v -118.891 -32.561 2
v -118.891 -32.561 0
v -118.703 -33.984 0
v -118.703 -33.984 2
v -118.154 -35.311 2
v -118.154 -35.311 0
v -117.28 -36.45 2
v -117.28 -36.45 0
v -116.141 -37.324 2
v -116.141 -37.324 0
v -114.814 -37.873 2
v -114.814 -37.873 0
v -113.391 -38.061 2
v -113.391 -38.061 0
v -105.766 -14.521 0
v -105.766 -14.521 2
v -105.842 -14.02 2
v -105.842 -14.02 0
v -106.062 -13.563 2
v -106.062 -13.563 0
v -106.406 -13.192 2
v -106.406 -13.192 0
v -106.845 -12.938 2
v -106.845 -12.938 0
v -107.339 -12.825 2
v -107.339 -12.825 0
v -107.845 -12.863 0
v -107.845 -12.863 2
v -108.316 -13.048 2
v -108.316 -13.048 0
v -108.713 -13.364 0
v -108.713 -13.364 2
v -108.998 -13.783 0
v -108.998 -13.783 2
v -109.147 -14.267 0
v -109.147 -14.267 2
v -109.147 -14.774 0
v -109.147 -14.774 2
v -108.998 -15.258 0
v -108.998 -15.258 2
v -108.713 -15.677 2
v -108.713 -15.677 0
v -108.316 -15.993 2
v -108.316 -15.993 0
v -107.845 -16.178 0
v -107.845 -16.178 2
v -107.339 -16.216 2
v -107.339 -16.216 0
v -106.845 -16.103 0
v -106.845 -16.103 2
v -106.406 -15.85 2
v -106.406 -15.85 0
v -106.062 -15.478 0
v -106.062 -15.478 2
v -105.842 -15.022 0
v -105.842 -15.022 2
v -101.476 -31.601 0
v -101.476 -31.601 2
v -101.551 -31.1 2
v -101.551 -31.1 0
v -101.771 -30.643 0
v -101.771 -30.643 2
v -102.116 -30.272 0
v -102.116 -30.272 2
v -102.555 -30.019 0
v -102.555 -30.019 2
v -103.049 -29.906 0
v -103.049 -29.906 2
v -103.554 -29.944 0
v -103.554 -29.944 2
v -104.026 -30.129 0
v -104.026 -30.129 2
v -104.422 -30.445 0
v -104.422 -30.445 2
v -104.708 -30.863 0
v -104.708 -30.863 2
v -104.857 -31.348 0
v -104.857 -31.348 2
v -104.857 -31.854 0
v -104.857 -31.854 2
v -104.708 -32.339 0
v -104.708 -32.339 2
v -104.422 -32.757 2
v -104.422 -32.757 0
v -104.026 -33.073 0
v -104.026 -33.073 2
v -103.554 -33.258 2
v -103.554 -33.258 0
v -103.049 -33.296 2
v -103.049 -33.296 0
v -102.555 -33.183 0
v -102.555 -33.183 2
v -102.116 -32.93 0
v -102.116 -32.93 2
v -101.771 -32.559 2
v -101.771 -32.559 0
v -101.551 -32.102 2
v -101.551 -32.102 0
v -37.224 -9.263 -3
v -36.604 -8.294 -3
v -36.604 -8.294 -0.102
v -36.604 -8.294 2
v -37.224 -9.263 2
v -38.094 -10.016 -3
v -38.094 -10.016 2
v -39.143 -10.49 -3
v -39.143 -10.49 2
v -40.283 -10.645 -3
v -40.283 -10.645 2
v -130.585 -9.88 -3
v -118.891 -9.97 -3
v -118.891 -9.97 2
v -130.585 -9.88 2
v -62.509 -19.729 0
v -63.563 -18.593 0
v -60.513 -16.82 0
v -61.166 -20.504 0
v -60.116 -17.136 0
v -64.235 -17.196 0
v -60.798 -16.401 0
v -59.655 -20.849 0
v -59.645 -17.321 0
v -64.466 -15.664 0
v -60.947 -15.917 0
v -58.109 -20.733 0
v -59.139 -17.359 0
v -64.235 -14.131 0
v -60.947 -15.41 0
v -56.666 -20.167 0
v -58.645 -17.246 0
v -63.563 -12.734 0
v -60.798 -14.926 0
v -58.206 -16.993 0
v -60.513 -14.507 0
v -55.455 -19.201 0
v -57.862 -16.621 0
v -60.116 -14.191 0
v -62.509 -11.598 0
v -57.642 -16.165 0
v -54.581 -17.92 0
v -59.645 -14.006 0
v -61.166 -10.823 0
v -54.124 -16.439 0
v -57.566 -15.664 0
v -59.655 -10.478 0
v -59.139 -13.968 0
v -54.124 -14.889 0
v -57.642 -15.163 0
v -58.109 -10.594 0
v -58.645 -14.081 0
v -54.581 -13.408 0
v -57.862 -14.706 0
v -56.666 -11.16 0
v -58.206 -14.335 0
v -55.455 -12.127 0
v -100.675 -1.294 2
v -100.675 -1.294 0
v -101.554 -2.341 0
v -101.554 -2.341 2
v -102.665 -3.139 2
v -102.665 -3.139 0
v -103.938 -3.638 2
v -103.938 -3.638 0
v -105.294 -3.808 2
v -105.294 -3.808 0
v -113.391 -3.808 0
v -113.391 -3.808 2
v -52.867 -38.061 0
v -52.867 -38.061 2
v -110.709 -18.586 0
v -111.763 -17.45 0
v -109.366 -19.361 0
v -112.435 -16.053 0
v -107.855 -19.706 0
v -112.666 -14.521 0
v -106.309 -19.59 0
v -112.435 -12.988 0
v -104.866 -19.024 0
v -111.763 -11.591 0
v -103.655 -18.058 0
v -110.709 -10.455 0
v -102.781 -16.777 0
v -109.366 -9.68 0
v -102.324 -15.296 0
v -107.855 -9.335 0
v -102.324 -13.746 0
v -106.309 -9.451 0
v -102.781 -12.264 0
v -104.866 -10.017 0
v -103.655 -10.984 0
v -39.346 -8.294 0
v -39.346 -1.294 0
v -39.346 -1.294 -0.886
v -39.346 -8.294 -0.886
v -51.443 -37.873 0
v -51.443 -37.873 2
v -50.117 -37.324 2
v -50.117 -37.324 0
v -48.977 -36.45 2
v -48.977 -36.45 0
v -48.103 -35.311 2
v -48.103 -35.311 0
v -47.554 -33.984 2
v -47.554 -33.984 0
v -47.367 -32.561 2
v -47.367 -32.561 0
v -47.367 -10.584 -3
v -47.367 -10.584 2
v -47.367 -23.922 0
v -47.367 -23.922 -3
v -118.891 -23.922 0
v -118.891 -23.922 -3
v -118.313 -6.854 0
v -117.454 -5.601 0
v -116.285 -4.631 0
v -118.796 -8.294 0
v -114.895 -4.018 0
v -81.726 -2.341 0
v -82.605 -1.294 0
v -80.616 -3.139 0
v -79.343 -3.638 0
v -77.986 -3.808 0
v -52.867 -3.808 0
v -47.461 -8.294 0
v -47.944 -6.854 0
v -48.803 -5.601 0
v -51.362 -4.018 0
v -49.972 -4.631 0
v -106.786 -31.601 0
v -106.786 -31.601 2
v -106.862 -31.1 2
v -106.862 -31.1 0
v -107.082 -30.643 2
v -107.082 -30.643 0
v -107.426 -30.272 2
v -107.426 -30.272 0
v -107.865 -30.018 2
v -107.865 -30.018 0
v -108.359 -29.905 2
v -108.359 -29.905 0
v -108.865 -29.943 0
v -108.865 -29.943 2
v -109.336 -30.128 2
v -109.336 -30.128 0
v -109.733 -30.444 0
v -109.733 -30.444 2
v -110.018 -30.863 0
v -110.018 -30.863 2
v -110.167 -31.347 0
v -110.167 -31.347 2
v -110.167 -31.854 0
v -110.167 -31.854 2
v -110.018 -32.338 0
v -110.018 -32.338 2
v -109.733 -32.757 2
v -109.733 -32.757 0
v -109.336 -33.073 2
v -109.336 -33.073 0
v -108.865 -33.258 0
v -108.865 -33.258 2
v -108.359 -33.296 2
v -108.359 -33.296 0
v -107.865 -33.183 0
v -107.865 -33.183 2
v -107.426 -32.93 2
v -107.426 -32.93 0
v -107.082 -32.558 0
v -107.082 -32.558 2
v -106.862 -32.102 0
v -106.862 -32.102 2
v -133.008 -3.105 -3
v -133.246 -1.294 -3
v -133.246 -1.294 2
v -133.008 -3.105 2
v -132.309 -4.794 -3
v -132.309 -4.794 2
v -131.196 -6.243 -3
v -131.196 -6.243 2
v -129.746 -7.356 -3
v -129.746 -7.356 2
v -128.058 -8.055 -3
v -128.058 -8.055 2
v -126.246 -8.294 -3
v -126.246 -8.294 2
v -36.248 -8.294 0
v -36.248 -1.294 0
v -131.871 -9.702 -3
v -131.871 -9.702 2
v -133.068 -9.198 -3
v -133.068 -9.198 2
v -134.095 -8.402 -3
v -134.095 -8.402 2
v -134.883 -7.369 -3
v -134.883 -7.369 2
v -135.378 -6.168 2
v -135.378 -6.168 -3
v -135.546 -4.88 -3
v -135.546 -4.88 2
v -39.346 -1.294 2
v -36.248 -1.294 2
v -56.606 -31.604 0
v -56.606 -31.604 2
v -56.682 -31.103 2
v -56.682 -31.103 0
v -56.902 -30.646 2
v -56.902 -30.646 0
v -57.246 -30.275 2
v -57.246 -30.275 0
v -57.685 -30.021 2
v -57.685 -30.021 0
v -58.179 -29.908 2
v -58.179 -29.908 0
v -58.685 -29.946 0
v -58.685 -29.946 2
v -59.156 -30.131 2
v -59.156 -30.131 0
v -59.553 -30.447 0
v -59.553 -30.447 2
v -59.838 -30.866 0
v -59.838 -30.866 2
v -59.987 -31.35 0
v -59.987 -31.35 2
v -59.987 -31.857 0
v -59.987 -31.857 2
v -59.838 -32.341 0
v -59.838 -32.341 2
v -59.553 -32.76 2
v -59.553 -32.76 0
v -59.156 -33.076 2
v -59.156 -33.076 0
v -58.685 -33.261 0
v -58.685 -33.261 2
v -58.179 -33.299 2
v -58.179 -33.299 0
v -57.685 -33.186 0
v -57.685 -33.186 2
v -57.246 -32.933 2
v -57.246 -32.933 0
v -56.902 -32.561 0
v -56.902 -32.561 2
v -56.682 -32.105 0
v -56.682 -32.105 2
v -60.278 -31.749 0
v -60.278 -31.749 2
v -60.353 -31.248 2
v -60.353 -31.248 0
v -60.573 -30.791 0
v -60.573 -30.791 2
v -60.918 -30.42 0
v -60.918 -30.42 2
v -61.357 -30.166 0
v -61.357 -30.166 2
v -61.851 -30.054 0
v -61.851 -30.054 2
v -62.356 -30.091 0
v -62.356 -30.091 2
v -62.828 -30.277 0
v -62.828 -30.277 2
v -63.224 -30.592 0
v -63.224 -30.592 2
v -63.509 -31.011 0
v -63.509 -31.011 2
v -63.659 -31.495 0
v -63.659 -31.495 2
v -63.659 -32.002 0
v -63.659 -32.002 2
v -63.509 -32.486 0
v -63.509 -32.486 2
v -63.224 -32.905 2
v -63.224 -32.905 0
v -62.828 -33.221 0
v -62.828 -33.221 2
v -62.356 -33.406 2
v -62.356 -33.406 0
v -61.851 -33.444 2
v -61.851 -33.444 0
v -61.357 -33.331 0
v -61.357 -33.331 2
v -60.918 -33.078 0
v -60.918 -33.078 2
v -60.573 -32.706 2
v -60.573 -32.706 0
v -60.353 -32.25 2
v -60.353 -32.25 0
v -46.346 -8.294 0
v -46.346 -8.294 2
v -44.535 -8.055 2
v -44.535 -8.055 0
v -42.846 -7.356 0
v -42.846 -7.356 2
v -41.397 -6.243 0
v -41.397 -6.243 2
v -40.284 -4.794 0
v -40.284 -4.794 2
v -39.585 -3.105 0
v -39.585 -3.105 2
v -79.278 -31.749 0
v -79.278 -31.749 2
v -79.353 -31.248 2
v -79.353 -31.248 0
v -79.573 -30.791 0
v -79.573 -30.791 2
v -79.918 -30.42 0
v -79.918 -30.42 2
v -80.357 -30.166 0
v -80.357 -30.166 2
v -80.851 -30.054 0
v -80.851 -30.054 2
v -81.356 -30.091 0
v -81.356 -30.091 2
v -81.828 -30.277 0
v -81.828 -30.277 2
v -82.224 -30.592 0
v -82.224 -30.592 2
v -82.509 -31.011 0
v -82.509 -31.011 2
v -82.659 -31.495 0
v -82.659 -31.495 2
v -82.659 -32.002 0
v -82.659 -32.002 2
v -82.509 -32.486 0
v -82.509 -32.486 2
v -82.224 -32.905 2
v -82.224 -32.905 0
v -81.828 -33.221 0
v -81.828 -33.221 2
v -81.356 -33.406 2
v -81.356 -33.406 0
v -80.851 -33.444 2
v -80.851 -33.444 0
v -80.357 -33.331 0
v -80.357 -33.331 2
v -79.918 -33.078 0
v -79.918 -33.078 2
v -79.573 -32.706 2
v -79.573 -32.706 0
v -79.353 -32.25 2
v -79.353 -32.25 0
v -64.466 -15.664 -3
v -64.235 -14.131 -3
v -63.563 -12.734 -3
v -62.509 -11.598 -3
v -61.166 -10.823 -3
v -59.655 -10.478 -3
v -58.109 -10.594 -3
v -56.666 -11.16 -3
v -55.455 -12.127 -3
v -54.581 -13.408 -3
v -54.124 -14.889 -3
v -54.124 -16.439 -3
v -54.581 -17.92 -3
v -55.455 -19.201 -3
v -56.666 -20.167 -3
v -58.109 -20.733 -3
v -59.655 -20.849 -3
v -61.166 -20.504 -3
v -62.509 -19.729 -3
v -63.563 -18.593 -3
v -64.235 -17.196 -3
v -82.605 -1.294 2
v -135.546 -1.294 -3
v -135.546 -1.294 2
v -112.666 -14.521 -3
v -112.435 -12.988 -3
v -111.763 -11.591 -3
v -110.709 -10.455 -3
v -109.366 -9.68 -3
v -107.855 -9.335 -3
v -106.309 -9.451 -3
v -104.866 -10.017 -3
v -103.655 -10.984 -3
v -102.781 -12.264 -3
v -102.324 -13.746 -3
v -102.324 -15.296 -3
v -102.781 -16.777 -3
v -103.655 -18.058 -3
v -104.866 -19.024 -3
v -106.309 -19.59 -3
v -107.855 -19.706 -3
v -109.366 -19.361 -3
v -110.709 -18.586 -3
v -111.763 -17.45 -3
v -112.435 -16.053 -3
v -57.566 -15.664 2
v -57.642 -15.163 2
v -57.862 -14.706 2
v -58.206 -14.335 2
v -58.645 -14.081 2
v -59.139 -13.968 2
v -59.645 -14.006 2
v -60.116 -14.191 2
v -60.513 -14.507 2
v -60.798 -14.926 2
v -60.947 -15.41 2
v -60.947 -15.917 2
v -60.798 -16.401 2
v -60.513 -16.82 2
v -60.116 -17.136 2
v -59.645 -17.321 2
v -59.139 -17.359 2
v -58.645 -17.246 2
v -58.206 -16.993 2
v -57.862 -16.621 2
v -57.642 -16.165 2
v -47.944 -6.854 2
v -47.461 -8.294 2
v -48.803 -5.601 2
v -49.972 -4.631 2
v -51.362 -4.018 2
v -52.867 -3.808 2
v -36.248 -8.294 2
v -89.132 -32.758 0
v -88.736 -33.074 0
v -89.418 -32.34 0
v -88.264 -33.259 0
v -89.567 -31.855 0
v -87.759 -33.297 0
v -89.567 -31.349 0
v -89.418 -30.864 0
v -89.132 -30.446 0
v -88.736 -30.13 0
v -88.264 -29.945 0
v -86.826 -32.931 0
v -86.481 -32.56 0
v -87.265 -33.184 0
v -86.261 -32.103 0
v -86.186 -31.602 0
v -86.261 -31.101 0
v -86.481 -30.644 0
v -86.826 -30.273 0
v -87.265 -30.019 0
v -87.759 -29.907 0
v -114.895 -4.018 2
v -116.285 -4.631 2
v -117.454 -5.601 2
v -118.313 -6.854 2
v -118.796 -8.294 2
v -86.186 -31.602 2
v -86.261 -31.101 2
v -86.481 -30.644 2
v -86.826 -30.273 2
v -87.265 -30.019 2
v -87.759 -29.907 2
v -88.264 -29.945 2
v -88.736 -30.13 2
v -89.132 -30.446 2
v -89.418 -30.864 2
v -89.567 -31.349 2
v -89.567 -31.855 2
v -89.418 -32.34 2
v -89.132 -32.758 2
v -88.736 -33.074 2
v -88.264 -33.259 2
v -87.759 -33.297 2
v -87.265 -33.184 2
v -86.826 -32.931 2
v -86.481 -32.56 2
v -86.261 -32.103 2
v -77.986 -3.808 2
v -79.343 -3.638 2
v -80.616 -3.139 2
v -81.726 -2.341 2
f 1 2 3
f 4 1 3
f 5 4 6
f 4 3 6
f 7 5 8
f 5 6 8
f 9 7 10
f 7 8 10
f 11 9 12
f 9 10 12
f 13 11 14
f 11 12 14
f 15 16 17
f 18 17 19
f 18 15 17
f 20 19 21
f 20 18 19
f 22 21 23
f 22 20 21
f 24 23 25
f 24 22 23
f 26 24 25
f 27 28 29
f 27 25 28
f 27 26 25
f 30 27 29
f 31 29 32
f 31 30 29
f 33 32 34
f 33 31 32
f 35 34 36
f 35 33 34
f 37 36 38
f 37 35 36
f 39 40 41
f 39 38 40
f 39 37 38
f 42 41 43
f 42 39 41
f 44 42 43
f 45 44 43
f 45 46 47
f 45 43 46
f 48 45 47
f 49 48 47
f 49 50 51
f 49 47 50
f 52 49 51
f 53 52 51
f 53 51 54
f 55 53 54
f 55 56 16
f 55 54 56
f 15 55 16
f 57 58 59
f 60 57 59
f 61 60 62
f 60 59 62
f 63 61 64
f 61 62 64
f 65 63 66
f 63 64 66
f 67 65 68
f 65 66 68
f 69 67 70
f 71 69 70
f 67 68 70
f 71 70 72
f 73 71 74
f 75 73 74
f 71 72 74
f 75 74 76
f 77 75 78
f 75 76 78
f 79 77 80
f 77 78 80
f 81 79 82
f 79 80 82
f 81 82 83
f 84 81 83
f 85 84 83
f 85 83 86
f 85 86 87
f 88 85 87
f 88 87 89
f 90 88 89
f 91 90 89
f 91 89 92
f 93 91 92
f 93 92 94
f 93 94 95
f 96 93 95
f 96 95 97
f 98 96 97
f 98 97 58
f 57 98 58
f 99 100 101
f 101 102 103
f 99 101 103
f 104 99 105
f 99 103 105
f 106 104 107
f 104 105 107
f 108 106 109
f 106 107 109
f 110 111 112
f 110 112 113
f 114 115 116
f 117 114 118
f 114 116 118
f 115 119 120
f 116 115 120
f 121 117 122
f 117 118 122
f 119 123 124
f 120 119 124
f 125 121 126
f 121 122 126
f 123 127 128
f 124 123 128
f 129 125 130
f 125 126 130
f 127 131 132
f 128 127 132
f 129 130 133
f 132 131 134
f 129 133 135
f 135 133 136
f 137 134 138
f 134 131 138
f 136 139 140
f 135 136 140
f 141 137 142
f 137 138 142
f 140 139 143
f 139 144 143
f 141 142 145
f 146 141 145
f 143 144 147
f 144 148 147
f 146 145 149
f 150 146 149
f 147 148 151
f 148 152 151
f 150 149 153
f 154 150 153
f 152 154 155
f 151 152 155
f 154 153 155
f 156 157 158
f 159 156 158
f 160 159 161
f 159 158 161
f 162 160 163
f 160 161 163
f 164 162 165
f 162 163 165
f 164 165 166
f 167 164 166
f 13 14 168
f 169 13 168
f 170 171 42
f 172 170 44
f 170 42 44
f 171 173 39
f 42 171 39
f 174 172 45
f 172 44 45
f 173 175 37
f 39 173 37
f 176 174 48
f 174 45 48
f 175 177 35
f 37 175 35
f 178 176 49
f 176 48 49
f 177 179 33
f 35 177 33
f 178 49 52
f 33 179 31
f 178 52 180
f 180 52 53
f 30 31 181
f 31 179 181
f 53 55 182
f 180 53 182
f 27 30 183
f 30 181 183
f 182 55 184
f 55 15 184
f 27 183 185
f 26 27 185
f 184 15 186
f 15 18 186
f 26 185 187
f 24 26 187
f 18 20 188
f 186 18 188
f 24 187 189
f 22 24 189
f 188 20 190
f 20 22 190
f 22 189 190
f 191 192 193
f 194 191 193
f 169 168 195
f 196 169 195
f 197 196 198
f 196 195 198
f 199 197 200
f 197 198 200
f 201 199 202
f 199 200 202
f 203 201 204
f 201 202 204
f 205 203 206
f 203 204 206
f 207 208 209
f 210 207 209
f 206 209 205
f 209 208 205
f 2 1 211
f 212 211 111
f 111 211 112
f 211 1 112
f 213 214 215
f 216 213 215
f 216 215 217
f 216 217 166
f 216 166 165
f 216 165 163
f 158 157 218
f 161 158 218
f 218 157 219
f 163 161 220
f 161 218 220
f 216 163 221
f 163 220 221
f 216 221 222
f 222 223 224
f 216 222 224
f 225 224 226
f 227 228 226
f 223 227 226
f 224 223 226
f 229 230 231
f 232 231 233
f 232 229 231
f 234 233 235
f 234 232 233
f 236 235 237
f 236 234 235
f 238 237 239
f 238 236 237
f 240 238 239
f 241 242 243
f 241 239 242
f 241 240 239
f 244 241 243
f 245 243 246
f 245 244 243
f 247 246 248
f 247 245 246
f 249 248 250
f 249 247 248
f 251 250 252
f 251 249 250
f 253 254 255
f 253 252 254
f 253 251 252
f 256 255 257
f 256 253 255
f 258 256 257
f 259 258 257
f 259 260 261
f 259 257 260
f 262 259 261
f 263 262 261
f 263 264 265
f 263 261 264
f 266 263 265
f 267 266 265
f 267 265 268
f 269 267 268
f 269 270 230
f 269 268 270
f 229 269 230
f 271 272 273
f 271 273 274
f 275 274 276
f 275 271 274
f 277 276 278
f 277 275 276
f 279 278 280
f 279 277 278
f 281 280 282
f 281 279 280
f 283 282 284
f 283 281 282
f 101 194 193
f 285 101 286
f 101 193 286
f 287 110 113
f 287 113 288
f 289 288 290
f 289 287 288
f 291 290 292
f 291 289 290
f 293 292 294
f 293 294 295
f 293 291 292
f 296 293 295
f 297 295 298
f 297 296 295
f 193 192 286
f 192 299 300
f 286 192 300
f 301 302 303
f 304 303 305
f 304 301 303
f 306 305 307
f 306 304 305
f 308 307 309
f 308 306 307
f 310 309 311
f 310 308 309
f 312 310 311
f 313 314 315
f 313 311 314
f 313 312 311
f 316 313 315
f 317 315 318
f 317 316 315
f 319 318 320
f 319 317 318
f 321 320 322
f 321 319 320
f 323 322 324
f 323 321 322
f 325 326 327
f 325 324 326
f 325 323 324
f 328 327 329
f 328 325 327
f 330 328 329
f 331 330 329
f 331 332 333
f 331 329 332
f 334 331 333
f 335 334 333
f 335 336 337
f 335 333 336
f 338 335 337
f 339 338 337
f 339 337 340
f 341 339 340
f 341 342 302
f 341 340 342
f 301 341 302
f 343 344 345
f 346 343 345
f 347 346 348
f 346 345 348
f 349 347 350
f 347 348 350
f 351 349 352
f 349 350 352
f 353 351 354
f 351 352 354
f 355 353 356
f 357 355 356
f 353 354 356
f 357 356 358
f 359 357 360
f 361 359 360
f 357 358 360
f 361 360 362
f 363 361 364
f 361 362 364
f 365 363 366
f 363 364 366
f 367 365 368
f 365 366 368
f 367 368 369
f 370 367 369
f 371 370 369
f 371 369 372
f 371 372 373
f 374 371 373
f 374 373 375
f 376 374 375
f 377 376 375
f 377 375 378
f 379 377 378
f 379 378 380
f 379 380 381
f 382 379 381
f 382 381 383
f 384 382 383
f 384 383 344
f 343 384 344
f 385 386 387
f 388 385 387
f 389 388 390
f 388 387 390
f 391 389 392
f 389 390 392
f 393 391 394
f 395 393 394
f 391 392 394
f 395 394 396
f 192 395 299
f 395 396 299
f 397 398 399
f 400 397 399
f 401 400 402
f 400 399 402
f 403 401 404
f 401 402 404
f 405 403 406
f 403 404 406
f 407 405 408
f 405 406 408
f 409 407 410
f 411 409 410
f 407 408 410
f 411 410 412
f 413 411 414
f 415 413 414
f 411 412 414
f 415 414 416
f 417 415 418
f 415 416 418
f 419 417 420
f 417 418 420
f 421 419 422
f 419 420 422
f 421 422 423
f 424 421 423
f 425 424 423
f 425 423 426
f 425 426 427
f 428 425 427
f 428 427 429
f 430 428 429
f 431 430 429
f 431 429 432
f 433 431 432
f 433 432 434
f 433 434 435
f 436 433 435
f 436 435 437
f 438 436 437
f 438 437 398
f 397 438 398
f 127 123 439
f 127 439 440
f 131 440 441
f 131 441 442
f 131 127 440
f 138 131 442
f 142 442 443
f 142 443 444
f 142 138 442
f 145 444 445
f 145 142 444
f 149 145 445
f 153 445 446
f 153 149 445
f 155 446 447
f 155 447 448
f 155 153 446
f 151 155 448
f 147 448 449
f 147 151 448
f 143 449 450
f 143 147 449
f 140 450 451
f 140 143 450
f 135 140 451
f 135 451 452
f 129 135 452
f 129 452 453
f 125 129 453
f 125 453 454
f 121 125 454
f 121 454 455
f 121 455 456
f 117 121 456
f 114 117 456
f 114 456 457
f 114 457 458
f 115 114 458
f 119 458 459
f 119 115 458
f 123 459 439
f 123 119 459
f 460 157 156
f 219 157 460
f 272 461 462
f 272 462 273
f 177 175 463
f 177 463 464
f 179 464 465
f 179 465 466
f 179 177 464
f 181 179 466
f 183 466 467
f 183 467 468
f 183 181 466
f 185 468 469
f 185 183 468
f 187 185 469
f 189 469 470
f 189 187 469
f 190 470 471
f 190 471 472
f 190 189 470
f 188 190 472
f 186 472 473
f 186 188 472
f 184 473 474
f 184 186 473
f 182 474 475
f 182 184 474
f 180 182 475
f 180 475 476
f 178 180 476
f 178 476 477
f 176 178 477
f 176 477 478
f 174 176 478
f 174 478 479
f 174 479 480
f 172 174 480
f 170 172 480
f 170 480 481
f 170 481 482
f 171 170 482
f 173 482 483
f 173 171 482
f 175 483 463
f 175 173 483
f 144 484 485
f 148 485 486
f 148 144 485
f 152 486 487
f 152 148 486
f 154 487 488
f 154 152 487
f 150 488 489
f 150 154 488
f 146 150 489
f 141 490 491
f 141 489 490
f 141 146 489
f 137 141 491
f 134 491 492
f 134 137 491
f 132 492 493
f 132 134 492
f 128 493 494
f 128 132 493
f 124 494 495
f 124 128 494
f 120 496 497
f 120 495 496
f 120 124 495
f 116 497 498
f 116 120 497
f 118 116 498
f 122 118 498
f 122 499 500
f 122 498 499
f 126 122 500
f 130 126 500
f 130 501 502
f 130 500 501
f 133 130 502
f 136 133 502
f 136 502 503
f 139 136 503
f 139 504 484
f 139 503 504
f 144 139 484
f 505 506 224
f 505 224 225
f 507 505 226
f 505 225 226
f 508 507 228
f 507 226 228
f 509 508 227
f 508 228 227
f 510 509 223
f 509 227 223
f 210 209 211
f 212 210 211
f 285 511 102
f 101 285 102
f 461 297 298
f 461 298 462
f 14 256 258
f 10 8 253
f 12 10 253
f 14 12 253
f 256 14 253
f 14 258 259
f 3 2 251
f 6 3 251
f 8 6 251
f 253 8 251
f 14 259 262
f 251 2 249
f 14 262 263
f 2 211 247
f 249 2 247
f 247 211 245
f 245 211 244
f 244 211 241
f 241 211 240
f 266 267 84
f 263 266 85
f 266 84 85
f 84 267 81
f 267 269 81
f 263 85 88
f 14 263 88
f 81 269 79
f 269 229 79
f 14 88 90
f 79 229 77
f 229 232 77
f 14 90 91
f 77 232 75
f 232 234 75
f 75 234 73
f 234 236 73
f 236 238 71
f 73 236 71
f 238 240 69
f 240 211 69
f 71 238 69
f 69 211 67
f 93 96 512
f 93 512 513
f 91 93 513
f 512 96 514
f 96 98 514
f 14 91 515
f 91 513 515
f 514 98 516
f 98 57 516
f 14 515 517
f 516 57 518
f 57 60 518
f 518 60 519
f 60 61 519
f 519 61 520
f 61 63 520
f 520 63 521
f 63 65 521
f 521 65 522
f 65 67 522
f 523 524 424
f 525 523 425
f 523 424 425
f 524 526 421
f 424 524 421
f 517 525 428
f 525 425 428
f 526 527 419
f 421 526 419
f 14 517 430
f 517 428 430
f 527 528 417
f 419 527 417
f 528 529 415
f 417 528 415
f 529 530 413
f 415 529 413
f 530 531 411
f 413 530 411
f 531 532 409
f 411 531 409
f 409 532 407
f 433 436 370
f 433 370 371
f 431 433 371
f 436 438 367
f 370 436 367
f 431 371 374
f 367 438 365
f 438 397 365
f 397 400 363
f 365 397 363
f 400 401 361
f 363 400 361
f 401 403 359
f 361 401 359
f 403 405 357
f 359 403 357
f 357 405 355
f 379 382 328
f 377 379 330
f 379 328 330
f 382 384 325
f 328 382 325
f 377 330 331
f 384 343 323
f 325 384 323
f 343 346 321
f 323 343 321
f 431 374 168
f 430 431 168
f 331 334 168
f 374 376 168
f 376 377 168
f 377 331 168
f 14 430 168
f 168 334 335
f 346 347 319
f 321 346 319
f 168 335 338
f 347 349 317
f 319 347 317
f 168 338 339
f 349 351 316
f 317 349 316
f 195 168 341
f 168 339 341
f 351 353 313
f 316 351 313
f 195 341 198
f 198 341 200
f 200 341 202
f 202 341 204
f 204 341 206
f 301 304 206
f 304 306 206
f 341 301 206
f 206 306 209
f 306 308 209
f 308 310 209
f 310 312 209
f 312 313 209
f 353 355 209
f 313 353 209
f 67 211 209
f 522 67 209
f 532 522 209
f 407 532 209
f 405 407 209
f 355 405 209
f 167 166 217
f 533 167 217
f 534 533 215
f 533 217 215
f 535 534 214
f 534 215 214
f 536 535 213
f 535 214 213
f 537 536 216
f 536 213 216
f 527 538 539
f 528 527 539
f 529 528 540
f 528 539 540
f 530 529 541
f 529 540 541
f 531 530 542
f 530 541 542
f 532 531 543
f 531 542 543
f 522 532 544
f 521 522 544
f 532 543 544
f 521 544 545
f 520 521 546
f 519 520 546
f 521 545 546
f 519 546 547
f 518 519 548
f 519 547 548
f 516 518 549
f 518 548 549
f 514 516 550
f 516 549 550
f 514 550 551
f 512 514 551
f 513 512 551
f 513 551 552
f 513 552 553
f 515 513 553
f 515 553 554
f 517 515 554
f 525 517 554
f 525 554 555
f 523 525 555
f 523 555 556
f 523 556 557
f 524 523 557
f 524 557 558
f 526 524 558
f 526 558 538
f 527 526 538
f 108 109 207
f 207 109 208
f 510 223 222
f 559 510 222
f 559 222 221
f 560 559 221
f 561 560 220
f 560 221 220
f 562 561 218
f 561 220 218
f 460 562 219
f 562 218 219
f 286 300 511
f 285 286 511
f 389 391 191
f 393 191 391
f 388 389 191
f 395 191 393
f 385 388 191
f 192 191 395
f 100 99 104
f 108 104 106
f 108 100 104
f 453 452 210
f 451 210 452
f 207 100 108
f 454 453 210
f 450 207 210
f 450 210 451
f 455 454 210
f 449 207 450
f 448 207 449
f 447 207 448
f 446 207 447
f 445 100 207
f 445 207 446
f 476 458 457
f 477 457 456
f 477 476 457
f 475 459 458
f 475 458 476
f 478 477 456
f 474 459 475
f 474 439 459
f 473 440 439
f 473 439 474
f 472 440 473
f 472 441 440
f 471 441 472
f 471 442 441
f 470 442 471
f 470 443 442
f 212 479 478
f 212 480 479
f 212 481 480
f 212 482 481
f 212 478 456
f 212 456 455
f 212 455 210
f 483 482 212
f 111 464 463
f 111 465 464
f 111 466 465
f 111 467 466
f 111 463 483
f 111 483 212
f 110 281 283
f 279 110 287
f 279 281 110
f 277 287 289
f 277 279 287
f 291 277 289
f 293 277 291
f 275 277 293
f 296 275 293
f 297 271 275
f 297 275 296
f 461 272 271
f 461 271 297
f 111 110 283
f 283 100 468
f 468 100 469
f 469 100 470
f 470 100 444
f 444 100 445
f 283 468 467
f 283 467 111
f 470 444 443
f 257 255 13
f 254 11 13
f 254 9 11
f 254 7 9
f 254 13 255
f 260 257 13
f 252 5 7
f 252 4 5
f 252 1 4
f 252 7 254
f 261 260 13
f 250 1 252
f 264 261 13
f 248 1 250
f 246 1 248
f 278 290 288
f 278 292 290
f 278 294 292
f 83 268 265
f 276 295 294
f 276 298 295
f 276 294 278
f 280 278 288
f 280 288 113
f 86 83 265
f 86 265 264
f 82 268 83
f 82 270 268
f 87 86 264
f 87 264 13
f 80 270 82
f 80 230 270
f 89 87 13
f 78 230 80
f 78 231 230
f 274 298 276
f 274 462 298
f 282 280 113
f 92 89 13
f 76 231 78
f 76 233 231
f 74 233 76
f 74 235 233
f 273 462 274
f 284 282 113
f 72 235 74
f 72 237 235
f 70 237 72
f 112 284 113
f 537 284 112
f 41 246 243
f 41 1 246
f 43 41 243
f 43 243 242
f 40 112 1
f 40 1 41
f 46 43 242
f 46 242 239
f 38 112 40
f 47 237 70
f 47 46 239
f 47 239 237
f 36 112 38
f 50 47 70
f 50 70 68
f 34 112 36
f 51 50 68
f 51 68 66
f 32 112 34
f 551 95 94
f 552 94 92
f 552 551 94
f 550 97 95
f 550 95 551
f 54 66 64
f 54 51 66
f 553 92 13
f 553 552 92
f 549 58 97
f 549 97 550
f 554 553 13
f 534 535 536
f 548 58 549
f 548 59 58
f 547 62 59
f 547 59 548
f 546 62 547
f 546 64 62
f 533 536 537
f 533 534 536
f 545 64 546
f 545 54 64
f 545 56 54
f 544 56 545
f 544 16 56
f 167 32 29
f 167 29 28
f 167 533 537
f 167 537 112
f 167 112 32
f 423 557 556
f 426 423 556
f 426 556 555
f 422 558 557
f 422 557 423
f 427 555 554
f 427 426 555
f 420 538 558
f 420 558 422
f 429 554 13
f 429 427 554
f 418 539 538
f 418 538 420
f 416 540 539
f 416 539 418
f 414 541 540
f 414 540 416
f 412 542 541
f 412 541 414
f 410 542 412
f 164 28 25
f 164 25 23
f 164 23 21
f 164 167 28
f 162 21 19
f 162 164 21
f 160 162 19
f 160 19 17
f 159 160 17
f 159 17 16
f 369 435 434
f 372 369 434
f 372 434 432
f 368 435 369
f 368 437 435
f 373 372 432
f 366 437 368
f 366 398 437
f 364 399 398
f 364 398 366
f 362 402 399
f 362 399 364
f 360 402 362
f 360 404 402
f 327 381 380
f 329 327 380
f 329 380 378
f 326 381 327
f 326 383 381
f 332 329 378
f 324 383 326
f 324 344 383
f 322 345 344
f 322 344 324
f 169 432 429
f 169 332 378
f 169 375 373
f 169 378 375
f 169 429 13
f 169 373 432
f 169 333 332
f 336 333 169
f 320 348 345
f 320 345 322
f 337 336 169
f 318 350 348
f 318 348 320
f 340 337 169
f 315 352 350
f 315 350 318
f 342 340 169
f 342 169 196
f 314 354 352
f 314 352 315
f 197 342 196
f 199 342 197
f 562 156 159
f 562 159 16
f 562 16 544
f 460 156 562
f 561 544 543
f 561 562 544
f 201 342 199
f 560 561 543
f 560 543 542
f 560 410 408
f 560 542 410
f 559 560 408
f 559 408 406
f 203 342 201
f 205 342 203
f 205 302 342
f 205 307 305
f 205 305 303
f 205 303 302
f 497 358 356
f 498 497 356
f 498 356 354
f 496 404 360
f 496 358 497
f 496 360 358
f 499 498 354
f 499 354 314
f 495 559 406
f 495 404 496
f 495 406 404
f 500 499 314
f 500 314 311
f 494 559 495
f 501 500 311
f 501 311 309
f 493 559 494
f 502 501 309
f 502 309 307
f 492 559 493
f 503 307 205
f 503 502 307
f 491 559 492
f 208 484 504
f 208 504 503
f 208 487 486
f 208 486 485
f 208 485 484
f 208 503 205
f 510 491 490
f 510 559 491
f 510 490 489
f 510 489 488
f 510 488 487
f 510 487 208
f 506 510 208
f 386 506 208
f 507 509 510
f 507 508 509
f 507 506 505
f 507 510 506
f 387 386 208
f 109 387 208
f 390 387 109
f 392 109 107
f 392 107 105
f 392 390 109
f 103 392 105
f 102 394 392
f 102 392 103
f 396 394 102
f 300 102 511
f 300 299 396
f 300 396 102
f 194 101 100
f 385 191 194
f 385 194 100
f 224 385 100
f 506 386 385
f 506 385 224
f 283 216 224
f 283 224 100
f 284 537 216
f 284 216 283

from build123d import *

# Parameters (mm, degrees)
ESQUISSE1_R             = 1.7
BOSS_EXTRU_1_DEPTH      = 3
BOSS_EXTRU_2_DEPTH      = 3
BOSS_EXTRU_2_DEPTH_BACK = 3
ESQUISSE2_R             = 5.2
ESQUISSE5_W             = 129.390100882
ESQUISSE5_H             = 125.631489025
ENL_V_MAT_EXTRU_2_DEPTH = 1
ESQUISSE6_R             = 1.5
ENL_V_MAT_EXTRU_3_DEPTH = 8
ESQUISSE7_W             = 14.610679854
ESQUISSE7_H             = 62.75
ENL_V_MAT_EXTRU_4_DEPTH = 8
BOSS_EXTRU_3_DEPTH      = 7
BOSS_EXTRU_4_DEPTH      = 7
ESQUISSE11_W            = 143.807333736
ESQUISSE11_H            = 19.954067826
ENL_V_MAT_EXTRU_5_DEPTH = 89
ESQUISSE12_R            = 1.7
ENL_V_MAT_EXTRU_6_DEPTH = 31


with BuildPart() as part:
    # Esquisse1 → Boss.-Extru.1 (new body)
    with BuildSketch(Plane.XY):
        with BuildLine():
            Line((-117.680084405, 66.939310237), (-117.680084405, 59.695120061))
            ThreePointArc((-117.680084405, 59.695120061), (-116.069171702, 55.806032765), (-112.180084405, 54.195120061))
            Line((-112.180084405, 54.195120061), (-105.294175096, 54.195120061))
            ThreePointArc((-105.294175096, 54.195120061), (-101.4050878, 52.584207358), (-99.794175096, 48.695120061))
            Line((-99.794175096, 48.695120061), (-99.794175096, 35.930823665))
            ThreePointArc((-99.794175096, 35.930823665), (-101.4050878, 32.041736368), (-105.294175096, 30.430823665))
            Line((-105.294175096, 30.430823665), (-112.180084405, 30.430823665))
            ThreePointArc((-112.180084405, 30.430823665), (-116.069171702, 28.819910961), (-117.680084405, 24.930823665))
            Line((-117.680084405, 24.930823665), (-117.680084405, 23.910007682))
            ThreePointArc((-117.680084405, 23.910007682), (-116.069171702, 20.020920385), (-112.180084405, 18.410007682))
            Line((-112.180084405, 18.410007682), (-105.294175096, 18.410007682))
            ThreePointArc((-105.294175096, 18.410007682), (-101.4050878, 16.799094979), (-99.794175096, 12.910007682))
            Line((-99.794175096, 12.910007682), (-99.794175096, 1.692208933))
            ThreePointArc((-99.794175096, 1.692208933), (-101.4050878, -2.196878364), (-105.294175096, -3.807791067))
            Line((-105.294175096, -3.807791067), (-113.390601299, -3.807791067))
            ThreePointArc((-113.390601299, -3.807791067), (-117.279688595, -5.418703771), (-118.890601299, -9.307791067))
            Line((-118.890601299, -9.307791067), (-118.890601299, -18.42196685))
            Line((-118.890601299, -18.42196685), (-118.890601299, -32.5606385))
            ThreePointArc((-118.890601299, -32.5606385), (-117.279688595, -36.449725797), (-113.390601299, -38.0606385))
            Line((-113.390601299, -38.0606385), (-52.866544484, -38.0606385))
            ThreePointArc((-52.866544484, -38.0606385), (-48.977457187, -36.449725797), (-47.366544484, -32.5606385))
            Line((-47.366544484, -32.5606385), (-47.366544484, -18.42196685))
            Line((-47.366544484, -18.42196685), (-47.366544484, -9.307791067))
            ThreePointArc((-47.366544484, -9.307791067), (-48.977457187, -5.418703771), (-52.866544484, -3.807791067))
            Line((-52.866544484, -3.807791067), (-77.986378892, -3.807791067))
            ThreePointArc((-77.986378892, -3.807791067), (-81.875466189, -2.196878364), (-83.486378892, 1.692208933))
            Line((-83.486378892, 1.692208933), (-83.486378892, 12.910007682))
            ThreePointArc((-83.486378892, 12.910007682), (-81.875466189, 16.799094979), (-77.986378892, 18.410007682))
            Line((-77.986378892, 18.410007682), (-69.856378892, 18.410007682))
            ThreePointArc((-69.856378892, 18.410007682), (-65.967291596, 20.020920385), (-64.356378892, 23.910007682))
            Line((-64.356378892, 23.910007682), (-64.356378892, 24.930823665))
            ThreePointArc((-64.356378892, 24.930823665), (-65.967291596, 28.819910961), (-69.856378892, 30.430823665))
            Line((-69.856378892, 30.430823665), (-77.986378892, 30.430823665))
            ThreePointArc((-77.986378892, 30.430823665), (-81.875466189, 32.041736368), (-83.486378892, 35.930823665))
            Line((-83.486378892, 35.930823665), (-83.486378892, 55.219310237))
            ThreePointArc((-83.486378892, 55.219310237), (-81.875466189, 59.108397534), (-77.986378892, 60.719310237))
            Line((-77.986378892, 60.719310237), (-54.190366806, 60.719310237))
            ThreePointArc((-54.190366806, 60.719310237), (-50.30127951, 62.330222941), (-48.690366806, 66.219310237))
            Line((-48.690366806, 66.219310237), (-48.690366806, 67.219310237))
            ThreePointArc((-48.690366806, 67.219310237), (-50.30127951, 71.108397534), (-54.190366806, 72.719310237))
            Line((-54.190366806, 72.719310237), (-112.180084405, 72.719310237))
            ThreePointArc((-112.180084405, 72.719310237), (-116.069171702, 71.108397534), (-117.680084405, 67.219310237))
            Line((-117.680084405, 67.219310237), (-117.680084405, 66.939310237))
        make_face()
        with Locations((-59.266378892, -15.663707737)):
            Circle(ESQUISSE1_R, mode=Mode.SUBTRACT)
        with Locations((-59.266378892, 66.939310237)):
            Circle(ESQUISSE1_R, mode=Mode.SUBTRACT)
        with Locations((-91.856378892, 36.719310237)):
            Circle(ESQUISSE1_R, mode=Mode.SUBTRACT)
        with Locations((-107.466378892, -14.520689763)):
            Circle(ESQUISSE1_R, mode=Mode.SUBTRACT)
        with Locations((-107.466378892, 60.719310237)):
            Circle(ESQUISSE1_R, mode=Mode.SUBTRACT)
        with Locations((-58.306378892, -31.603707737)):
            Circle(ESQUISSE1_R, mode=Mode.SUBTRACT)
        with Locations((-108.486378892, -31.600689763)):
            Circle(ESQUISSE1_R, mode=Mode.SUBTRACT)
        with BuildLine():
            Line((-111.390601299, 21.460065469), (-70.086378892, 21.460065469))
            ThreePointArc((-70.086378892, 21.460065469), (-68.67216533, 22.045851906), (-68.086378892, 23.460065469))
            Line((-68.086378892, 23.460065469), (-68.086378892, 24.842520386))
            ThreePointArc((-68.086378892, 24.842520386), (-68.67216533, 26.256733949), (-70.086378892, 26.842520386))
            Line((-70.086378892, 26.842520386), (-111.390601299, 26.842520386))
            ThreePointArc((-111.390601299, 26.842520386), (-112.804814861, 26.256733949), (-113.390601299, 24.842520386))
            Line((-113.390601299, 24.842520386), (-113.390601299, 23.460065469))
            ThreePointArc((-113.390601299, 23.460065469), (-112.804814861, 22.045851906), (-111.390601299, 21.460065469))
        make_face(mode=Mode.SUBTRACT)
    extrude(amount=BOSS_EXTRU_1_DEPTH)

    # Esquisse2 → Boss.-Extru.2 (add, two sides: drawn at the far end of the back side and taken through both)
    with BuildSketch(Plane(origin=(0, 0, 0), x_dir=(-1, 0, 0), z_dir=(0, 0, -1)).offset(-BOSS_EXTRU_2_DEPTH_BACK)):
        with BuildLine():
            Line((118.890601299, -9.969506719), (130.584615963, -9.880075131))
            ThreePointArc((130.584615963, -9.880075131), (134.095405897, -8.402210456), (135.546378892, -4.880221341))
            Line((135.546378892, -4.880221341), (135.546378892, 5.415623015))
            ThreePointArc((135.546378892, 5.415623015), (136.425058549, 7.536943358), (138.546378892, 8.415623015))
            Line((138.546378892, 8.415623015), (145.752654566, 8.415623015))
            ThreePointArc((145.752654566, 8.415623015), (147.87397491, 9.294302671), (148.752654566, 11.415623015))
            Line((148.752654566, 11.415623015), (148.752654566, 38.179170847))
            ThreePointArc((148.752654566, 38.179170847), (147.87397491, 40.300491191), (145.752654566, 41.179170847))
            Line((145.752654566, 41.179170847), (138.546378892, 41.179170847))
            ThreePointArc((138.546378892, 41.179170847), (136.425058549, 42.057850504), (135.546378892, 44.179170847))
            Line((135.546378892, 44.179170847), (135.546378892, 52.099902349))
            ThreePointArc((135.546378892, 52.099902349), (134.081912798, 55.635436255), (130.546378892, 57.099902349))
            Line((130.546378892, 57.099902349), (117.680084405, 57.099902349))
            Line((117.680084405, 57.099902349), (117.680084405, 72.719310237))
            Line((117.680084405, 72.719310237), (48.690366806, 72.719310237))
            Line((48.690366806, 72.719310237), (48.690366806, 60.719310237))
            Line((48.690366806, 60.719310237), (48.690366806, 57.099902349))
            Line((48.690366806, 57.099902349), (40.256901013, 57.099902349))
            ThreePointArc((40.256901013, 57.099902349), (37.428473888, 55.928329474), (36.256901013, 53.099902349))
            Line((36.256901013, 53.099902349), (36.256901013, 47.456292263))
            Line((36.256901013, 47.456292263), (39.346378892, 47.456292263))
            ThreePointArc((39.346378892, 47.456292263), (41.396631424, 52.406039732), (46.346378892, 54.456292263))
            Line((46.346378892, 54.456292263), (126.246378892, 54.456292263))
            ThreePointArc((126.246378892, 54.456292263), (131.196126361, 52.406039732), (133.246378892, 47.456292263))
            Line((133.246378892, 47.456292263), (133.246378892, 40.977229779))
            ThreePointArc((133.246378892, 40.977229779), (134.125058549, 38.855909436), (136.246378892, 37.977229779))
            Line((136.246378892, 37.977229779), (142.162261637, 37.977229779))
            ThreePointArc((142.162261637, 37.977229779), (144.28358198, 37.098550123), (145.162261637, 34.977229779))
            Line((145.162261637, 34.977229779), (145.162261637, 14.363062522))
            ThreePointArc((145.162261637, 14.363062522), (144.28358198, 12.241742179), (142.162261637, 11.363062522))
            Line((142.162261637, 11.363062522), (136.246378892, 11.363062522))
            ThreePointArc((136.246378892, 11.363062522), (134.125058549, 10.484382866), (133.246378892, 8.363062522))
            Line((133.246378892, 8.363062522), (133.246378892, -1.293707737))
            ThreePointArc((133.246378892, -1.293707737), (131.196126361, -6.243455205), (126.246378892, -8.293707737))
            Line((126.246378892, -8.293707737), (46.346378892, -8.293707737))
            ThreePointArc((46.346378892, -8.293707737), (41.396631424, -6.243455205), (39.346378892, -1.293707737))
            Line((39.346378892, -1.293707737), (36.248203357, -1.293707737))
            Line((36.248203357, -1.293707737), (36.248203357, -6.64542392))
            ThreePointArc((36.248203357, -6.64542392), (37.432020164, -9.486042202), (40.282759469, -10.645274652))
            Line((40.282759469, -10.645274652), (47.366544484, -10.58407535))
            Line((47.366544484, -10.58407535), (47.366544484, -23.92196685))
            Line((47.366544484, -23.92196685), (118.890601299, -23.92196685))
            Line((118.890601299, -23.92196685), (118.890601299, -9.969506719))
        make_face()
        with Locations((59.266378892, -15.663707737)):
            Circle(ESQUISSE2_R, mode=Mode.SUBTRACT)
        with Locations((107.466378892, -14.520689763)):
            Circle(ESQUISSE2_R, mode=Mode.SUBTRACT)
        with Locations((107.466378892, 60.719310237)):
            Circle(ESQUISSE2_R, mode=Mode.SUBTRACT)
        with Locations((59.266378892, 66.939310237)):
            Circle(ESQUISSE2_R, mode=Mode.SUBTRACT)
    extrude(amount=BOSS_EXTRU_2_DEPTH + BOSS_EXTRU_2_DEPTH_BACK)

    # Esquisse5 → Enlèv. mat.-Extru.2 (cut)
    with BuildSketch(Plane.XY.offset(3)):
        with Locations((-91.695706627, 17.054727605)):
            Rectangle(ESQUISSE5_W, ESQUISSE5_H)
    extrude(amount=-ENL_V_MAT_EXTRU_2_DEPTH, mode=Mode.SUBTRACT)

    # Esquisse6 → Enlèv. mat.-Extru.3 (cut)
    with BuildSketch(Plane.XY.offset(2)):
        with Locations((-69.623492164, 64.727424081)):
            Circle(ESQUISSE6_R)
        with Locations((-83.623492164, 64.727424081)):
            Circle(ESQUISSE6_R)
    extrude(amount=-ENL_V_MAT_EXTRU_3_DEPTH, mode=Mode.SUBTRACT)

    # Esquisse7 → Enlèv. mat.-Extru.4 (cut)
    with BuildSketch(Plane(origin=(0, 0, 0), x_dir=(-1, 0, 0), z_dir=(0, 0, -1))):
        with Locations((42.567758063, 23.081292263)):
            Rectangle(ESQUISSE7_W, ESQUISSE7_H)
    extrude(amount=ENL_V_MAT_EXTRU_4_DEPTH, mode=Mode.SUBTRACT)

    # Esquisse9 → Boss.-Extru.3 (add)
    with BuildSketch(Plane(origin=(0, -1.293707737, 0), x_dir=(1, 0, 0), z_dir=(0, 1, 0))):
        Polygon((-39.346378892, -2), (-39.346378892, 0.886005049), (-36.248203357, 0), (-36.248203357, -2), align=None)
    extrude(amount=-BOSS_EXTRU_3_DEPTH)

    # Esquisse10 → Boss.-Extru.4 (add)
    with BuildSketch(Plane.XZ.offset(-47.456292263)):
        Polygon((-39.346378892, 2), (-39.346378892, -0.873043126), (-36.256901013, 0), (-36.256901013, 2), align=None)
    extrude(amount=-BOSS_EXTRU_4_DEPTH)

    # Esquisse11 → Enlèv. mat.-Extru.5 (cut)
    with BuildSketch(Plane(origin=(0, -1.293707737, 0), x_dir=(1, 0, 0), z_dir=(0, 1, 0))):
        with Locations((-95.995427174, 3.905261548)):
            Rectangle(ESQUISSE11_W, ESQUISSE11_H)
    extrude(amount=ENL_V_MAT_EXTRU_5_DEPTH, mode=Mode.SUBTRACT)

    # Esquisse12 → Enlèv. mat.-Extru.6 (cut)
    with BuildSketch(Plane.XY.offset(2)):
        with Locations((-103.175863959, -31.601009153)):
            Circle(ESQUISSE12_R)
        with Locations((-87.885863987, -31.601928739)):
            Circle(ESQUISSE12_R)
        with Locations((-80.977833602, -31.748759482)):
            Circle(ESQUISSE12_R)
        with Locations((-61.977833602, -31.748759482)):
            Circle(ESQUISSE12_R)
    extrude(amount=-ENL_V_MAT_EXTRU_6_DEPTH, mode=Mode.SUBTRACT)


solid = part.part
